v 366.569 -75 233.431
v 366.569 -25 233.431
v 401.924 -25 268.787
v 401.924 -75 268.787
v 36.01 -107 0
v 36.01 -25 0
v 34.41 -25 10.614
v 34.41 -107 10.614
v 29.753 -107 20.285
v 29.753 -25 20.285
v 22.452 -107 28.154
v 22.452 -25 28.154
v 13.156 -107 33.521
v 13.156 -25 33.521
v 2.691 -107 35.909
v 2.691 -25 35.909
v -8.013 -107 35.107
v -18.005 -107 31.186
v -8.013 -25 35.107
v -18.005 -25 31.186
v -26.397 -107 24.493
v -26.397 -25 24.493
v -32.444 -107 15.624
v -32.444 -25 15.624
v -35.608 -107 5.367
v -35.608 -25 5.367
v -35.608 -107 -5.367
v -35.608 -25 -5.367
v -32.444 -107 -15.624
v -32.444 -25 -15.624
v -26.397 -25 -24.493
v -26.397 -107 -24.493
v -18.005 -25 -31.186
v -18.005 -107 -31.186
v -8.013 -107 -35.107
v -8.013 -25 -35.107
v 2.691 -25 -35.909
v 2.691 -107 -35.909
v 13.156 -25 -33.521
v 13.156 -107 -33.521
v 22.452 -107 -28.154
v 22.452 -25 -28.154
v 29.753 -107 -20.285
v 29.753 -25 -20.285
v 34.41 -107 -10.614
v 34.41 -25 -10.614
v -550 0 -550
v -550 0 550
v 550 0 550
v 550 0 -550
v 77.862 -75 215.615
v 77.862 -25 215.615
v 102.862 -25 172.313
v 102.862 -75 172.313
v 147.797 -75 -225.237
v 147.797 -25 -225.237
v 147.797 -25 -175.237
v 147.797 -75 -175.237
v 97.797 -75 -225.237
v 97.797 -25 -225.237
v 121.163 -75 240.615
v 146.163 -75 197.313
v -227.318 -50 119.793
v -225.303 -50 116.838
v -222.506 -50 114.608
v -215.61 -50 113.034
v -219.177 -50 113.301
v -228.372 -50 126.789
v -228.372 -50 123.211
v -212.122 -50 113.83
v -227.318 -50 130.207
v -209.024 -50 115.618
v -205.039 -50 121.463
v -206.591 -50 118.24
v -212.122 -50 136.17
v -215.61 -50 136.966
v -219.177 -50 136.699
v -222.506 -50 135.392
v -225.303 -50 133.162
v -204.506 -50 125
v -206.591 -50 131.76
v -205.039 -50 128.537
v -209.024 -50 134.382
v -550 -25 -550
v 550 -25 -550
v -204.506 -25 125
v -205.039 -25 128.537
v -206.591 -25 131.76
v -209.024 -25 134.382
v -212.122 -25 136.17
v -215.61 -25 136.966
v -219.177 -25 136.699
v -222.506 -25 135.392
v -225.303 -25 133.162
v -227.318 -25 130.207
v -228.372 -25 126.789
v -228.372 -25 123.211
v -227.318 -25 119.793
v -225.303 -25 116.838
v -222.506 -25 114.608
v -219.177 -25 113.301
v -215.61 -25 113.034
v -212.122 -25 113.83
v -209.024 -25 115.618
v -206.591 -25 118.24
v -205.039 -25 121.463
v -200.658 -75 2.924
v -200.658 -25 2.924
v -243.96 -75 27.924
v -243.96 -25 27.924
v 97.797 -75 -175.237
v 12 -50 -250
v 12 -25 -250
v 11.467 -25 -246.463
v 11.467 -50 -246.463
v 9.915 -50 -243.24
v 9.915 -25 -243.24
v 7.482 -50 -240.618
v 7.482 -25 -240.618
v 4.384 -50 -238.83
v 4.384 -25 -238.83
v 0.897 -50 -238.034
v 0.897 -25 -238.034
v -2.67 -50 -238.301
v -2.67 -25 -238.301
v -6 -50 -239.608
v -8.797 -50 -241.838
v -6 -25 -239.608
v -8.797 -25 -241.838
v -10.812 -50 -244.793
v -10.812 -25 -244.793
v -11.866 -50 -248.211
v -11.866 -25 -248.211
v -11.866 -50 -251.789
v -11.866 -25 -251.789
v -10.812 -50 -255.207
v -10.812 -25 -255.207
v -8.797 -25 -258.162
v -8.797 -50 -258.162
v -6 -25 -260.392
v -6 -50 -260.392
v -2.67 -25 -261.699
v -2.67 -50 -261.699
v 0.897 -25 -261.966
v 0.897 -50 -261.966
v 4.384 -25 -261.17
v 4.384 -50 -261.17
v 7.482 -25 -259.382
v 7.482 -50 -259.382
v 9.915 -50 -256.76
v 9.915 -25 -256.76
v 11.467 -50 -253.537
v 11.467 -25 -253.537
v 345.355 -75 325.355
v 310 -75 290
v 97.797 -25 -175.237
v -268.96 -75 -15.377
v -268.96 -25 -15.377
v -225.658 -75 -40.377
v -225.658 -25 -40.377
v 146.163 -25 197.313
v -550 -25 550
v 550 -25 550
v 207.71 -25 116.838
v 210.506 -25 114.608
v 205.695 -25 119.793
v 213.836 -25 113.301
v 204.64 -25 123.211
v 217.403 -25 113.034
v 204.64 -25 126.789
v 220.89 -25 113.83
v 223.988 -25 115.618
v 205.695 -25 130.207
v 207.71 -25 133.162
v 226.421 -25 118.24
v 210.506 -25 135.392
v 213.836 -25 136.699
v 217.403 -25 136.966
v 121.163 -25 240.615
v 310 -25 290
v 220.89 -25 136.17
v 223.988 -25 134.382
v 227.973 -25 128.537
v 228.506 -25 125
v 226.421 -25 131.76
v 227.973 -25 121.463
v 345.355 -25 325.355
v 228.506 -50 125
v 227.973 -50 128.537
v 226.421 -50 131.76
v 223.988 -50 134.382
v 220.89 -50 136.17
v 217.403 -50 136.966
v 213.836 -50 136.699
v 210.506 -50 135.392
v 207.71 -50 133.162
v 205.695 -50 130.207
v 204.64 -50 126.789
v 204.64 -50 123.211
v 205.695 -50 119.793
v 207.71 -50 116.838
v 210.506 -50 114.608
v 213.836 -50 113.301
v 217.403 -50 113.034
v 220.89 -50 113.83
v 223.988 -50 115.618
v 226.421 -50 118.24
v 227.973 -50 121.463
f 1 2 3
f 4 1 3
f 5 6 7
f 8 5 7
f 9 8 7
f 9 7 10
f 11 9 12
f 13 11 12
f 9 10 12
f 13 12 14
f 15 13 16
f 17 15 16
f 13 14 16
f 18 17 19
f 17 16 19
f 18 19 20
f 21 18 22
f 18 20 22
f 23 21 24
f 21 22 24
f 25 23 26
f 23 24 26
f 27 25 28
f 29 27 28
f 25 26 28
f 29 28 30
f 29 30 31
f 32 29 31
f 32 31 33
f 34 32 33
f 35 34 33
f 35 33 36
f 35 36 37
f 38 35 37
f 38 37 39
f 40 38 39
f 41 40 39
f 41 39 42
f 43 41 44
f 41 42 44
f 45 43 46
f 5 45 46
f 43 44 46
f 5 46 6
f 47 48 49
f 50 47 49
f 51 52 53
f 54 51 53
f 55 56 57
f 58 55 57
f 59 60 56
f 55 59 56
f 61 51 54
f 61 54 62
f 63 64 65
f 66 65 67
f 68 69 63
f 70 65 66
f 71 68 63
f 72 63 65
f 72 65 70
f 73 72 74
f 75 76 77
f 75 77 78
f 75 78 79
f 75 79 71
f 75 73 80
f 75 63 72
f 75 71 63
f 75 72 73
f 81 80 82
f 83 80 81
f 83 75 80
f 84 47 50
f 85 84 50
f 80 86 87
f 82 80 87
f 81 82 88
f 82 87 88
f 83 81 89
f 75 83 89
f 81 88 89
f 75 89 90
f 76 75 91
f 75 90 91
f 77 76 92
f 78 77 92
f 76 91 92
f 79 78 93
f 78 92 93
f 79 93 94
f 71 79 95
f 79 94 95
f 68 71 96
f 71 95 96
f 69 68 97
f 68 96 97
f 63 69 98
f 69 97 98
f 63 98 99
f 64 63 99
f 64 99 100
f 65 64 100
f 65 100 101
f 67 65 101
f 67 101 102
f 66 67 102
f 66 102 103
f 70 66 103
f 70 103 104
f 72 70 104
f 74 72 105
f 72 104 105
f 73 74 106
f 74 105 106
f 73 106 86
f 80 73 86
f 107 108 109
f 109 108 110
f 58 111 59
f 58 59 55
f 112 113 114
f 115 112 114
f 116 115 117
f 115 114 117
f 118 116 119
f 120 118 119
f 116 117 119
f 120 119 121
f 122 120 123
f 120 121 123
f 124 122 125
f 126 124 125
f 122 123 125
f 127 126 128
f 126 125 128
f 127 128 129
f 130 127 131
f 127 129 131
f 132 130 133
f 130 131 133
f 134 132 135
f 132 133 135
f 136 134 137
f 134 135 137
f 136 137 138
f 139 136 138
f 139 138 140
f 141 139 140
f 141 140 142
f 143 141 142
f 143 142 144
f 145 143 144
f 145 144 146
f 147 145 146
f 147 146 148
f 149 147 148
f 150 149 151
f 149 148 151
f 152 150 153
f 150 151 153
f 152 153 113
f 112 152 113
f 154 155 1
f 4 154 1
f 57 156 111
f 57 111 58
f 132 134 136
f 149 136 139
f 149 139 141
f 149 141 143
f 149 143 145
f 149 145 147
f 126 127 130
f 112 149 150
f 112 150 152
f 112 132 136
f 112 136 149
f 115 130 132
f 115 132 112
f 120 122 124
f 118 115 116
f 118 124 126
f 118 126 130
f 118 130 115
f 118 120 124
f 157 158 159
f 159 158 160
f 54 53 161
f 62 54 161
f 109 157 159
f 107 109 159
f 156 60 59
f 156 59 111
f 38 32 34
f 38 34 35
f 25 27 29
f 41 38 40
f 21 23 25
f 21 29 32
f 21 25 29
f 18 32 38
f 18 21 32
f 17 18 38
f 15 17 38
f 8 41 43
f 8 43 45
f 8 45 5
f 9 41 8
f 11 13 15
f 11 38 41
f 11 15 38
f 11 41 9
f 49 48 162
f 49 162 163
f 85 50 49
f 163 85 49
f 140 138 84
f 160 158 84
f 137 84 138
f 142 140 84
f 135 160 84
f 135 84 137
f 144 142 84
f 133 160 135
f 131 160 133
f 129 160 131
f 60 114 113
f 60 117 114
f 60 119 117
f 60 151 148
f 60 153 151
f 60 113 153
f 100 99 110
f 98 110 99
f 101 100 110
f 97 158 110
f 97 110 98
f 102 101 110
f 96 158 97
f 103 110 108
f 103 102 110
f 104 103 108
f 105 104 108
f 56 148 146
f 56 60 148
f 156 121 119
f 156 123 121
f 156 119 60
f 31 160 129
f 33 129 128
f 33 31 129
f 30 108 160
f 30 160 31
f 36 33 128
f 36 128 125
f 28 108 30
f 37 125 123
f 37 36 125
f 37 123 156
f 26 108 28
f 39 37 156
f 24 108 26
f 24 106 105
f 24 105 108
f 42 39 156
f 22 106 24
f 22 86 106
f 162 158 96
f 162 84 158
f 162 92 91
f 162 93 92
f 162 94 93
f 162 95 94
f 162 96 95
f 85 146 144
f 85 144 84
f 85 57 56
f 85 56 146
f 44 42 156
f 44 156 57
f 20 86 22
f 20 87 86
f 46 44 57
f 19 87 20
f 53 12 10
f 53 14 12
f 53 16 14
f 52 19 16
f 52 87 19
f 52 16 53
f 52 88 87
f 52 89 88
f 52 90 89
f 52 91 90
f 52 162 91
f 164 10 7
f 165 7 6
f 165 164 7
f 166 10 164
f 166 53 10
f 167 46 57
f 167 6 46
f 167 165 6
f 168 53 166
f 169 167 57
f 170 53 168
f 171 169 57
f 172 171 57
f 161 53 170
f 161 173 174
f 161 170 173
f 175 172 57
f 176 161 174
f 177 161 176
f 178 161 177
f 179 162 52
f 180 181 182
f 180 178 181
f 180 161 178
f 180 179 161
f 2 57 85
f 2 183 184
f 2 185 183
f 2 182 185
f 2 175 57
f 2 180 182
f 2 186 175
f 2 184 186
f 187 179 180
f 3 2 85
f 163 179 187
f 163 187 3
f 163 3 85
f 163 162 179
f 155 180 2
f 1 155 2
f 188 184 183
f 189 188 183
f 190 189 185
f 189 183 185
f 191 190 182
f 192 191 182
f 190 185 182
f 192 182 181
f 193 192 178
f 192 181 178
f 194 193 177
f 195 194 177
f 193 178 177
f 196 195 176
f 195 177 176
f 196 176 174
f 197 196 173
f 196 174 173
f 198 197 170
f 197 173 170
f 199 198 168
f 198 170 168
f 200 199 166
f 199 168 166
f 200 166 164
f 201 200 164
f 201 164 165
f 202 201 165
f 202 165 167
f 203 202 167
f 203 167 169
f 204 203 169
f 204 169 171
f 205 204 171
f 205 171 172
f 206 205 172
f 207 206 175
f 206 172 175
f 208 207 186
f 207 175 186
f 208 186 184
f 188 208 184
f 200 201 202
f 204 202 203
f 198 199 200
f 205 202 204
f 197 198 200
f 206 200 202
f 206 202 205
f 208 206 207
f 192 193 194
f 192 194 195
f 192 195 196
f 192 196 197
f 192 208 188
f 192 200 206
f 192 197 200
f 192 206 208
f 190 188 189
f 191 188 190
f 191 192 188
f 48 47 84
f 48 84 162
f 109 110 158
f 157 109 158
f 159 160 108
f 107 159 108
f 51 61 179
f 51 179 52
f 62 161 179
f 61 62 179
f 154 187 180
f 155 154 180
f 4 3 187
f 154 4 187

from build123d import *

# Parameters (mm, degrees)
F0_W      = 1100
F0_H      = 1100
F1_DEPTH  = 25
F2_R      = 36.0100678946
F3_DEPTH  = 82
F4_R      = 12
F5_DEPTH  = 25
F6_DEPTH  = 25
F7_W      = 50
F7_H      = 50
F8_DEPTH  = 50
F10_DEPTH = 50


# Not quite as in the source:
# - a feature names something its author has since deleted; it is built from what else it names


with BuildPart() as f1:
    # F0 (on Front) → F1 (new body)
    with BuildSketch(Plane.XZ):
        Rectangle(F0_W, F0_H)
    extrude(amount=F1_DEPTH)

    # F2 (on face) → F3 (join)
    with BuildSketch(Plane.XZ.offset(25)):
        Circle(F2_R)
    extrude(amount=F3_DEPTH)

    # F4 (on face) → F5 (join)
    with BuildSketch(Plane.XZ.offset(25)):
        with Locations((0, -250)):
            Circle(F4_R)
    extrude(amount=F5_DEPTH)

    # F4 (on face) → F6 (join)
    with BuildSketch(Plane.XZ.offset(25)):
        with Locations((-216.5063509461, 125)):
            Circle(F4_R)
        with Locations((216.5063509461, 125)):
            Circle(F4_R)
    extrude(amount=F6_DEPTH)

    # F7 (on face) → F8 (join)
    with BuildSketch(Plane.XZ.offset(25)):
        Polygon((121.1628514659, 240.6145112228), (77.8615812767, 215.6145112228), (102.8615812767, 172.3132410336), (146.1628514659, 197.3132410336), align=None)
        with Locations((122.7968535052, -200.2373629758)):
            Rectangle(F7_W, F7_H)
        Polygon((-268.9597049711, -15.377148247), (-225.6584347818, -40.377148247), (-200.6584347818, 2.9241219422), (-243.9597049711, 27.9241219422), align=None)
    extrude(amount=F8_DEPTH)

    # F9 (on face) → F10 (join)
    with BuildSketch(Plane.XZ.offset(25)):
        Polygon((345.3553390593, 325.3553390593), (310, 290), (366.5685424949, 233.4314575051), (401.9238815543, 268.7867965644), align=None)
    extrude(amount=F10_DEPTH)


solid = f1.part
